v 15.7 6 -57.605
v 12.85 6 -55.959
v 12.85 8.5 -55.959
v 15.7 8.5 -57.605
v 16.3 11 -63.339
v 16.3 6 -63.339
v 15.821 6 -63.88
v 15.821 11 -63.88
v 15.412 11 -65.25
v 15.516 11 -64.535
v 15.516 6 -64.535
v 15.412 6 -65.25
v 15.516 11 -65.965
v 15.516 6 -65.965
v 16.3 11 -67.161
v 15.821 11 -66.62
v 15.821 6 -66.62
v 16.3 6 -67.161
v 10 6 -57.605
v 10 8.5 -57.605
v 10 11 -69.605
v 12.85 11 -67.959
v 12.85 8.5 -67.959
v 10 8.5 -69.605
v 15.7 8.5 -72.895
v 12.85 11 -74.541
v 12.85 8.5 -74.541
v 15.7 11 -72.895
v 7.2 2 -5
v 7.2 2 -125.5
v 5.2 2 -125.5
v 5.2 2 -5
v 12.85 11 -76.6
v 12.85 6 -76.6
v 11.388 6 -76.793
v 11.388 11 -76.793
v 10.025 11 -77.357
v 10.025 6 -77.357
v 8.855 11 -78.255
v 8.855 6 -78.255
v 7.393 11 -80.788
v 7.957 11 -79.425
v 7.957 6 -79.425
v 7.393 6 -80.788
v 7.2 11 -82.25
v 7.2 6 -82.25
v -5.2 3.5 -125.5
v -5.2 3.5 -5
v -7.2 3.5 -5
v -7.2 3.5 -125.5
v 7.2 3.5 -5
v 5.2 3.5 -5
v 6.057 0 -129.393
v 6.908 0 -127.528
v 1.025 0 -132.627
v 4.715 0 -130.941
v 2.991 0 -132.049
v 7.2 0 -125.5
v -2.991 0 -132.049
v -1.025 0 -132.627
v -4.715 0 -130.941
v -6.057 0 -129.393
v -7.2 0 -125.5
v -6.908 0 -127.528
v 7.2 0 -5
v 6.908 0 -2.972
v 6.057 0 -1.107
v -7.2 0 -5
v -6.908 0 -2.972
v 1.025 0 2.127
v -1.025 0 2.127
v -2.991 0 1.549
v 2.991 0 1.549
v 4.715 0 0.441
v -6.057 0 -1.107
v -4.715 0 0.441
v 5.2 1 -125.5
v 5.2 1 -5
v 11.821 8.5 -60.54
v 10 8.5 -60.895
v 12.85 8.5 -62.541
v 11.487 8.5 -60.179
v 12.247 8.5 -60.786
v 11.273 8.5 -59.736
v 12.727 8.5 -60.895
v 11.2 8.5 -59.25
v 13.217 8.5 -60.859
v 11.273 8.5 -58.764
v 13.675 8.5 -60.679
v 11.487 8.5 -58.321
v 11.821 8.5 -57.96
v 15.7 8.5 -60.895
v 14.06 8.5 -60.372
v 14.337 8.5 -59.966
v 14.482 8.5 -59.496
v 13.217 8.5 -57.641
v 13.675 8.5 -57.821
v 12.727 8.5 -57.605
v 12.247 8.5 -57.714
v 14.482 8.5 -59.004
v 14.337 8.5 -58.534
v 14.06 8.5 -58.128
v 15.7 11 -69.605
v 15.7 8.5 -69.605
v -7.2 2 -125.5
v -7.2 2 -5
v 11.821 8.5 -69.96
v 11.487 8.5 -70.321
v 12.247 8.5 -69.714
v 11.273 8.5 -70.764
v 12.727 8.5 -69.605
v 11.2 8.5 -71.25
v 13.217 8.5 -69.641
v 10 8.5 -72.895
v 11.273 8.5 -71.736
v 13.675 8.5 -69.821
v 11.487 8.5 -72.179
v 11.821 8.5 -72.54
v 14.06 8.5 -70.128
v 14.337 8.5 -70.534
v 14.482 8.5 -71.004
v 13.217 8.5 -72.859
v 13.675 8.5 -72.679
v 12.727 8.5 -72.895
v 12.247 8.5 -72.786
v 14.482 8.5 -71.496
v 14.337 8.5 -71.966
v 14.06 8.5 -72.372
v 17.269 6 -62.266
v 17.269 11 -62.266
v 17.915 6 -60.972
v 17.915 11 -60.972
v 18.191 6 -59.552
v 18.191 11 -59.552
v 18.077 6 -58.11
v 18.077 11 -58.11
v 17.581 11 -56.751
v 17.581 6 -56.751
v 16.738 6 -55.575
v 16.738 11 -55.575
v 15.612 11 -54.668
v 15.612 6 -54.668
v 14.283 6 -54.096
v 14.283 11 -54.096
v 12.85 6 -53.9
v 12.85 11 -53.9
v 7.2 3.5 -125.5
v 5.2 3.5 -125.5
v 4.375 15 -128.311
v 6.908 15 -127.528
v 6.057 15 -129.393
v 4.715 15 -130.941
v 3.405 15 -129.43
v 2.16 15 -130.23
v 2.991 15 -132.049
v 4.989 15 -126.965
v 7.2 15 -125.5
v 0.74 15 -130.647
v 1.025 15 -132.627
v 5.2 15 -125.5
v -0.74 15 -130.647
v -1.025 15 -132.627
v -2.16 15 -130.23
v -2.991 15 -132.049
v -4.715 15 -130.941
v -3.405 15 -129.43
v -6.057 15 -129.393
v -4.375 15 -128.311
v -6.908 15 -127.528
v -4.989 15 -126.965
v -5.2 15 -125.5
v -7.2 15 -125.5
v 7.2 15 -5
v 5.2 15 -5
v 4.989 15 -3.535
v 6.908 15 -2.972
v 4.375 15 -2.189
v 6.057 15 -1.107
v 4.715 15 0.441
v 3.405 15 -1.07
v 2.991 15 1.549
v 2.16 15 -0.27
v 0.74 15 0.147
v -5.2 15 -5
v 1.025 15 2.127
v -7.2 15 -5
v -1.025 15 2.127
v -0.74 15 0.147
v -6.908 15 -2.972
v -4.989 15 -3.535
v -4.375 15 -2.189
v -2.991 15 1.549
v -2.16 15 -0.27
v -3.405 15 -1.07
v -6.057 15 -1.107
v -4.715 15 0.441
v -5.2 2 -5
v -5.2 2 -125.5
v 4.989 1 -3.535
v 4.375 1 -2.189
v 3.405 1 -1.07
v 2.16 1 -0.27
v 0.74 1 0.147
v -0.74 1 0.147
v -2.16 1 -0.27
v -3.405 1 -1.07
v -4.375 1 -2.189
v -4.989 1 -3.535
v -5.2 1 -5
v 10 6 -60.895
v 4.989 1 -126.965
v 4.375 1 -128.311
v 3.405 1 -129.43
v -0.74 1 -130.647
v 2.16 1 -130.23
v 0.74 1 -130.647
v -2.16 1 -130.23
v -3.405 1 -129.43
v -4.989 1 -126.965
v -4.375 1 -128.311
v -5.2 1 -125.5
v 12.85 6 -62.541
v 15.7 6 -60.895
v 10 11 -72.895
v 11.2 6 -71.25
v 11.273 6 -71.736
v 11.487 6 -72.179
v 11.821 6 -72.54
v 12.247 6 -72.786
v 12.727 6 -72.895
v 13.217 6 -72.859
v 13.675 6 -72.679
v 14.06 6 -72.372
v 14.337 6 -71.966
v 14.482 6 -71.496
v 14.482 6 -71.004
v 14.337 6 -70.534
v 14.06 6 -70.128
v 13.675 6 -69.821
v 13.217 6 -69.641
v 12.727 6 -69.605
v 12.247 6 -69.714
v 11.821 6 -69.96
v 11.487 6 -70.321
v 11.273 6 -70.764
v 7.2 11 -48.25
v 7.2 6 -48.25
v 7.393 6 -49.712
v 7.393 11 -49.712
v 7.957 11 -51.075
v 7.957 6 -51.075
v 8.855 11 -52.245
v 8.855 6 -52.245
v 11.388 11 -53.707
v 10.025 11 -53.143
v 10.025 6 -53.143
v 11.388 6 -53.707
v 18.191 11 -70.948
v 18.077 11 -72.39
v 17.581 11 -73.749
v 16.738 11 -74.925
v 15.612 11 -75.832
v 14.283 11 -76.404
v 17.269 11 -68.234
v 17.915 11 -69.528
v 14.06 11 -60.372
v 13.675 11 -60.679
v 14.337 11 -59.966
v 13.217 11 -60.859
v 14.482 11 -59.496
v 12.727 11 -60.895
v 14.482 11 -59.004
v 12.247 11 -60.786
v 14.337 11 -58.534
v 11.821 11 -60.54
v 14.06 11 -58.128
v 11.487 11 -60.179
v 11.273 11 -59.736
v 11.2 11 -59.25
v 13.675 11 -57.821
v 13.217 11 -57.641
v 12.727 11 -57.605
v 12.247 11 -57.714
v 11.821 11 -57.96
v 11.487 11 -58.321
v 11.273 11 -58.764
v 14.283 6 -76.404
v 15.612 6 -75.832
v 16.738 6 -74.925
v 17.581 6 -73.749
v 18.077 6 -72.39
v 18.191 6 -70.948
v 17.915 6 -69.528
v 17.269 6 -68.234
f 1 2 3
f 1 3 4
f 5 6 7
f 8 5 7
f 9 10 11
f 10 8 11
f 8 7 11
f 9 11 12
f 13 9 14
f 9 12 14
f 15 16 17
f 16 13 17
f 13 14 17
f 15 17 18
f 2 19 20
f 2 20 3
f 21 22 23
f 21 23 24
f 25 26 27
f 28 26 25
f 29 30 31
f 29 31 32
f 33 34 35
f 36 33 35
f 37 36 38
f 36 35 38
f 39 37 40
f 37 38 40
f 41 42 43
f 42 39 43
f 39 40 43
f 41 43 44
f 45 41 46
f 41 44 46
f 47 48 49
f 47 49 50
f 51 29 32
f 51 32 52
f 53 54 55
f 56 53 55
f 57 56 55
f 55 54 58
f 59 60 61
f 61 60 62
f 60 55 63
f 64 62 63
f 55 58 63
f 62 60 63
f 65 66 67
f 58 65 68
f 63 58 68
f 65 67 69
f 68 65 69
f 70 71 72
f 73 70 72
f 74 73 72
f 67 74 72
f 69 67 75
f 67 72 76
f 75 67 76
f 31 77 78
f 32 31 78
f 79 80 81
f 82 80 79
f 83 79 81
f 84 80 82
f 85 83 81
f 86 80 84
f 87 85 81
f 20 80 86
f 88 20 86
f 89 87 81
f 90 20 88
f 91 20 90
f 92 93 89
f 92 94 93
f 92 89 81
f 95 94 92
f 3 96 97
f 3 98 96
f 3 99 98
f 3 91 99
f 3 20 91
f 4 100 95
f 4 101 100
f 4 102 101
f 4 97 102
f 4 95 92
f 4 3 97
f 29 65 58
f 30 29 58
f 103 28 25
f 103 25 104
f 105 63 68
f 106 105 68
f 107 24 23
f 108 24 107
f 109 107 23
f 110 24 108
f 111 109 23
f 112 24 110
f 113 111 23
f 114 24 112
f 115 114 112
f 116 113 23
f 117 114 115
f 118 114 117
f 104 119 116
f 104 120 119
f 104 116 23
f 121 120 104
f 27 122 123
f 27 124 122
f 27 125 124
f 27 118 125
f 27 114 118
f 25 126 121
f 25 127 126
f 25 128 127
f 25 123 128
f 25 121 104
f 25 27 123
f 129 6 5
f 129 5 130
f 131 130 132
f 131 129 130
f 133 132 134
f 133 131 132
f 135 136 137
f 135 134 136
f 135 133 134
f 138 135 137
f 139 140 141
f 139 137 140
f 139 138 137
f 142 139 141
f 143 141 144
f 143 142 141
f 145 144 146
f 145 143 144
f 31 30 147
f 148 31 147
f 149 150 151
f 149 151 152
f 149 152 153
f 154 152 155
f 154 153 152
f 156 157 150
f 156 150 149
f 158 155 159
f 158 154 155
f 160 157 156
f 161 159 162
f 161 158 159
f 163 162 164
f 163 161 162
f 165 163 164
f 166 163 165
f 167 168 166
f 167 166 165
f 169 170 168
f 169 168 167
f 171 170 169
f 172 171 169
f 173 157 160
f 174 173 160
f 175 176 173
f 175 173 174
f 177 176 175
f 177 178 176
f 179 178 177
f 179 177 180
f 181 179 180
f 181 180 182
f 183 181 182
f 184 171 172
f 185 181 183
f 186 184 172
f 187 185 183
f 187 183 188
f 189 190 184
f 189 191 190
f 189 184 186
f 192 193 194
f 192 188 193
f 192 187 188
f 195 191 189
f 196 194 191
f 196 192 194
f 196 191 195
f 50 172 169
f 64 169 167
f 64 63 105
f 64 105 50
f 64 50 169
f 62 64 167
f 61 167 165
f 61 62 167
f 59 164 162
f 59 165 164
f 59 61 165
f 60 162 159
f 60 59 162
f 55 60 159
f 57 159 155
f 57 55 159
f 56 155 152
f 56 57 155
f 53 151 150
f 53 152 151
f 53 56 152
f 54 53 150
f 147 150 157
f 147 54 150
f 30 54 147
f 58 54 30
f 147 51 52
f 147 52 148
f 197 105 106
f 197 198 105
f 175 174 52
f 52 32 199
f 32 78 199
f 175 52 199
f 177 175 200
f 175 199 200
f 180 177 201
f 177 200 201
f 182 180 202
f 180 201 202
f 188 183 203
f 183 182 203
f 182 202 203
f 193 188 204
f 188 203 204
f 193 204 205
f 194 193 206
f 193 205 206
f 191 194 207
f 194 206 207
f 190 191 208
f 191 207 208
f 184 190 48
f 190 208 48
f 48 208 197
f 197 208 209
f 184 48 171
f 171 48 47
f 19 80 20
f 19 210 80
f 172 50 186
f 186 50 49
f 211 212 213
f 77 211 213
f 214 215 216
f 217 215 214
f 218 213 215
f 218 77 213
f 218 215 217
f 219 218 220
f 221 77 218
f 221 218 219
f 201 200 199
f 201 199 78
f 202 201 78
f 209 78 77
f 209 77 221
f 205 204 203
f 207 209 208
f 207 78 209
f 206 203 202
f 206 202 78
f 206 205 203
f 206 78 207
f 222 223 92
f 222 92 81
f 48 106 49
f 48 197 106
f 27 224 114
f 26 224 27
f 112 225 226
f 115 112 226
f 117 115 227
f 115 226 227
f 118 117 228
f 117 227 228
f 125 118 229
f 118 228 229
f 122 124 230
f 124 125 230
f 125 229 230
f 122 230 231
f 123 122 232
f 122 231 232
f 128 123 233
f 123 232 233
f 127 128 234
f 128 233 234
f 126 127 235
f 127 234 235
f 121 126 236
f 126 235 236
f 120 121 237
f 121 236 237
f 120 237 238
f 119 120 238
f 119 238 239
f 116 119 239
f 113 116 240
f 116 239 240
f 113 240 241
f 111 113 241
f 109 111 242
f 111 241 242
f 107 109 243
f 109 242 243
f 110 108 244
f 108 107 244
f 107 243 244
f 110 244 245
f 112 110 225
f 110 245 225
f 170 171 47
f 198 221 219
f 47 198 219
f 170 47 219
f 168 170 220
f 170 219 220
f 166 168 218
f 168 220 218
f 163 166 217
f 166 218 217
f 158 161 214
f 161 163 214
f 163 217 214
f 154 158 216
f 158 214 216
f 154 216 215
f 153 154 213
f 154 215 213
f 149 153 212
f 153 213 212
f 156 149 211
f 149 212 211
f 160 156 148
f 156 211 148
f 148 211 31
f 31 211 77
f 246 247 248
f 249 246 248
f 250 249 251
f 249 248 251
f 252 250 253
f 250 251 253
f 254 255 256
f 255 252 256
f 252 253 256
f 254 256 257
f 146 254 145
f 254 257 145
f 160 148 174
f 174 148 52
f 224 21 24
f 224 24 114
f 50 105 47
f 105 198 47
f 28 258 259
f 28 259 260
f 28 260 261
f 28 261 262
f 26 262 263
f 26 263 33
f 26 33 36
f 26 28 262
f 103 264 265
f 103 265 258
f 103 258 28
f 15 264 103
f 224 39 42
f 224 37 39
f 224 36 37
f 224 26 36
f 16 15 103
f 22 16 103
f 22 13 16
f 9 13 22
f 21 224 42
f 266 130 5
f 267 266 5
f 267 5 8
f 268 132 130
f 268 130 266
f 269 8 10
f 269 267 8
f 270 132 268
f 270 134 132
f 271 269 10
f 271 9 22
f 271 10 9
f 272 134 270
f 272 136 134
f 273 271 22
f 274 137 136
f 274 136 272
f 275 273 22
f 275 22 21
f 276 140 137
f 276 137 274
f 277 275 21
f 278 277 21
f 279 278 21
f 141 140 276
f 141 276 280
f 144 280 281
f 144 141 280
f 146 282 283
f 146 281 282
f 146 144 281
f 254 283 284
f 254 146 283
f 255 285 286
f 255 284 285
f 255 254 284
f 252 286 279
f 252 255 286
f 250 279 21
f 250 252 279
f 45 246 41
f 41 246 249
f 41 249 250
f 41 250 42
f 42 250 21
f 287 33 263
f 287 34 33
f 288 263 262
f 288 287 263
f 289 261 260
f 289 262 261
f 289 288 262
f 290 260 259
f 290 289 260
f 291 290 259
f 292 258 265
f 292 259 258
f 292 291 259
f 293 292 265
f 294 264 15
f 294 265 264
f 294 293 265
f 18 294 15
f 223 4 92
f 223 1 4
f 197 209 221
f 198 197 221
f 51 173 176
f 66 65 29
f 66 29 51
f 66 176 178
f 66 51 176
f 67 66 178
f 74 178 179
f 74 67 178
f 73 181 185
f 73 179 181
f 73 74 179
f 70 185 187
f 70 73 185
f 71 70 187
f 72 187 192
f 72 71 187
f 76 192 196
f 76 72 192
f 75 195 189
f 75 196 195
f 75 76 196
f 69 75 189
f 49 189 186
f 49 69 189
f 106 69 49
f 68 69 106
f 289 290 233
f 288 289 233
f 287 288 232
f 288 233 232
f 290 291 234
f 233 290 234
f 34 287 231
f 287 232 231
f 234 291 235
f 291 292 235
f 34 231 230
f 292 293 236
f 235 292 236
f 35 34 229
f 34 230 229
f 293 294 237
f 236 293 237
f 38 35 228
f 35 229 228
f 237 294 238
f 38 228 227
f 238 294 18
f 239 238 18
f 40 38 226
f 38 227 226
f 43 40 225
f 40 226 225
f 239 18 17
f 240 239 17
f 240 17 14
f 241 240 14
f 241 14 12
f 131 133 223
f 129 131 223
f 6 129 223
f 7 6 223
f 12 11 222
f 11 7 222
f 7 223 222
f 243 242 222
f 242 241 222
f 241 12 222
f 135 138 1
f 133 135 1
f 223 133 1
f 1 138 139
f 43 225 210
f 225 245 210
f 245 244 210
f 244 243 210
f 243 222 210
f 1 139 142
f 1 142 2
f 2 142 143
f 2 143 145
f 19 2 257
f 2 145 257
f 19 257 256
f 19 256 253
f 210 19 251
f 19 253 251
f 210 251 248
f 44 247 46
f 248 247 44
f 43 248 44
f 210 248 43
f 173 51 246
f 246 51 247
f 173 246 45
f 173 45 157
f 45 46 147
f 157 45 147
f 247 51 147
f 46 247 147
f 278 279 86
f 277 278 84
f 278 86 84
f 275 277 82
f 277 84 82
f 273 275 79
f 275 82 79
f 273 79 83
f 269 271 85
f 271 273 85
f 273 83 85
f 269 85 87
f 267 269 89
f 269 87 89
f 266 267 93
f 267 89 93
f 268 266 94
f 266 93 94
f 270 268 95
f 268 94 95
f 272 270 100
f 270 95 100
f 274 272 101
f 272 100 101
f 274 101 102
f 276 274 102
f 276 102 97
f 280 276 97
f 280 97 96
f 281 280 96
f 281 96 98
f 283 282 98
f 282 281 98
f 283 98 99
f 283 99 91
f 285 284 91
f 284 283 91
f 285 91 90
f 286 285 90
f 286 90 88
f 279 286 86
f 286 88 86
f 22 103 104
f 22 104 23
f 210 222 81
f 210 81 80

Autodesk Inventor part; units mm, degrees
ref_plane "YZ Plane" through (0, 0, 0) normal (1, 0, 0) x (0, 1, 0)
ref_plane "XZ Plane" through (0, 0, 0) normal (0, 1, 0) x (-1, 0, 0)
sketch "Sketch1" plane through (0, 0, 0) normal (0, 1, 0) x (-1, 0, 0)
  line L0 (0, 0) -> (0, -130.5) construction
  line L1 (-5, -5) -> (-5, -125.5) construction
  line L2 (5, -125.5) -> (5, -5) construction
  arc A0 (5, -5) -> (-5, -5) centre (0, -5) ccw construction
  arc A1 (-5, -125.5) -> (5, -125.5) centre (0, -125.5) ccw construction
  line L3 (0, -65.25) -> (0, -71.25) construction
  line L4 (-5.2, -125.5) -> (-5.2, -5)
  arc A2 (5.2, -5) -> (-5.2, -5) centre (0, -5) ccw
  line L5 (5.2, -5) -> (5.2, -125.5)
  arc A3 (-5.2, -125.5) -> (5.2, -125.5) centre (0, -125.5) ccw
  line L6 (7.2, -125.5) -> (7.2, -5)
  arc A4 (7.2, -5) -> (-7.2, -5) centre (0, -5) ccw
  line L7 (-7.2, -5) -> (-7.2, -125.5)
  arc A5 (-7.2, -125.5) -> (7.2, -125.5) centre (0, -125.5) ccw
  line L8 (0, -71.25) -> (-12.85, -71.25) construction
  circle A6 centre (-12.85, -71.25) radius 1.65
  line L9 (-7.2, -76.6) -> (-12.85, -76.6)
  arc A7 (-12.85, -65.9) -> (-12.85, -76.6) centre (-12.85, -71.25) ccw
  line L10 (-12.85, -65.9) -> (-7.2, -65.9)
  line L11 (0, -65.25) -> (0, -59.25) construction
  line L12 (0, -59.25) -> (-7.2, -59.25) construction
  line L13 (-7.2, -59.25) -> (-12.85, -59.25) construction
  circle A8 centre (-12.85, -59.25) radius 1.65
  arc A9 (-12.85, -53.9) -> (-12.85, -64.6) centre (-12.85, -59.25) ccw
  line L14 (-12.85, -64.6) -> (-7.2, -64.6)
  line L15 (-12.85, -53.9) -> (-7.2, -53.9)
  arc A10 (-16.2998, -67.1608) -> (-16.2998, -63.3392) centre (-17.9119, -65.25) ccw
  arc A11 (-7.2, -82.25) -> (-12.85, -76.6) centre (-12.85, -82.25) ccw
  arc A12 (-12.85, -53.9) -> (-7.2, -48.25) centre (-12.85, -48.25) ccw
  point P0 (-11.2, -71.25)
  point P1 (-11.2, -59.25)
  point P2 (-11.2, -59.25)
  dimension "d15" = 3.3
  dimension "d20" = 3.3
  dimension "d0" = 130.5
  dimension "d1" = 10
  dimension "d2" = 6
  dimension "d6" = 0.2
  dimension "d7" = 2
  dimension "d14" = 3.7
  dimension "d16" = 4
  dimension "d17" = 6
  dimension "d18" = 3.7
  dimension "d19" = 4
  dimension "d24" = 2.5
extrude "Extrusion1" add sketch "Sketch1" along normal blind 1 contours L4 A2 L5 A3
extrude "Extrusion2" add sketch "Sketch1" along normal blind 15 contours A5 L7 A4 L6
ref_plane "Work Plane1" through (0, 6, 0) normal (0, -1, 0) x (1, 0, 0)
extrude "Extrusion4" add sketch "Sketch1" along normal blind 5 from surface at 6 contours A11 L9 L7 | L7 L15 A12 | L9 A7 L10 L7 | L7 L14 A9 L15 | L10 A7 A10 A9 L14 L7
sketch "Sketch2" plane through (7.2, 0, -5) normal (1, 0, 0) x (0, 0, -1)
  line L0 (0, 0) -> (0, 15) projected
  line L1 (120.5, 0) -> (120.5, 15) projected
  line L2 (0, 3.5) -> (120.5, 3.5)
  line L3 (120.5, 3.5) -> (120.5, 2)
  line L4 (120.5, 2) -> (0, 2)
  line L5 (0, 2) -> (0, 3.5)
  line L6 (0, 0) -> (120.5, 0) projected
  point P0 (-5, 0)
  point P1 (0, 2)
  dimension "d28" = 2
  dimension "d31" = 1.5
extrude "Extrusion5" cut sketch "Sketch2" against normal through all contours L0 L2 L1 L4
sketch "Sketch3" plane through (7.2, 6, -82.25) normal (0, -1, 0) x (1, 0, 0)
  circle A0 centre (5.65, 23) radius 1.65 projected
  line L0 (5.65, 26.2909) -> (8.5, 24.6454)
  line L1 (8.5, 24.6454) -> (8.5, 21.3546)
  line L2 (8.5, 21.3546) -> (5.65, 19.7091)
  line L3 (5.65, 19.7091) -> (2.8, 21.3546)
  line L4 (2.8, 21.3546) -> (2.8, 24.6454)
  line L5 (2.8, 24.6454) -> (5.65, 26.2909)
  point P0 (-7.2, 82.25)
  dimension "d32" = 5.7
sketch "Sketch4" plane through (7.2, 11, -48.25) normal (0, 1, 0) x (1, 0, 0)
  circle A0 centre (5.65, 23) radius 1.65 projected
  line L0 (8.5, 24.6454) -> (8.5, 21.3546)
  line L1 (8.5, 21.3546) -> (5.65, 19.7091)
  line L2 (5.65, 19.7091) -> (2.8, 21.3546)
  line L3 (2.8, 21.3546) -> (2.8, 24.6454)
  line L4 (2.8, 24.6454) -> (5.65, 26.2909)
  line L5 (5.65, 26.2909) -> (8.5, 24.6454)
  point P0 (-7.2, -48.25)
  dimension "d33" = 5.7
extrude "Extrusion6" cut sketch "Sketch4" against normal blind 2.5
extrude "Extrusion7" cut sketch "Sketch3" against normal blind 2.5
properties part number "wiper_linkage_magnet_holder" material "ABS Plastic"
